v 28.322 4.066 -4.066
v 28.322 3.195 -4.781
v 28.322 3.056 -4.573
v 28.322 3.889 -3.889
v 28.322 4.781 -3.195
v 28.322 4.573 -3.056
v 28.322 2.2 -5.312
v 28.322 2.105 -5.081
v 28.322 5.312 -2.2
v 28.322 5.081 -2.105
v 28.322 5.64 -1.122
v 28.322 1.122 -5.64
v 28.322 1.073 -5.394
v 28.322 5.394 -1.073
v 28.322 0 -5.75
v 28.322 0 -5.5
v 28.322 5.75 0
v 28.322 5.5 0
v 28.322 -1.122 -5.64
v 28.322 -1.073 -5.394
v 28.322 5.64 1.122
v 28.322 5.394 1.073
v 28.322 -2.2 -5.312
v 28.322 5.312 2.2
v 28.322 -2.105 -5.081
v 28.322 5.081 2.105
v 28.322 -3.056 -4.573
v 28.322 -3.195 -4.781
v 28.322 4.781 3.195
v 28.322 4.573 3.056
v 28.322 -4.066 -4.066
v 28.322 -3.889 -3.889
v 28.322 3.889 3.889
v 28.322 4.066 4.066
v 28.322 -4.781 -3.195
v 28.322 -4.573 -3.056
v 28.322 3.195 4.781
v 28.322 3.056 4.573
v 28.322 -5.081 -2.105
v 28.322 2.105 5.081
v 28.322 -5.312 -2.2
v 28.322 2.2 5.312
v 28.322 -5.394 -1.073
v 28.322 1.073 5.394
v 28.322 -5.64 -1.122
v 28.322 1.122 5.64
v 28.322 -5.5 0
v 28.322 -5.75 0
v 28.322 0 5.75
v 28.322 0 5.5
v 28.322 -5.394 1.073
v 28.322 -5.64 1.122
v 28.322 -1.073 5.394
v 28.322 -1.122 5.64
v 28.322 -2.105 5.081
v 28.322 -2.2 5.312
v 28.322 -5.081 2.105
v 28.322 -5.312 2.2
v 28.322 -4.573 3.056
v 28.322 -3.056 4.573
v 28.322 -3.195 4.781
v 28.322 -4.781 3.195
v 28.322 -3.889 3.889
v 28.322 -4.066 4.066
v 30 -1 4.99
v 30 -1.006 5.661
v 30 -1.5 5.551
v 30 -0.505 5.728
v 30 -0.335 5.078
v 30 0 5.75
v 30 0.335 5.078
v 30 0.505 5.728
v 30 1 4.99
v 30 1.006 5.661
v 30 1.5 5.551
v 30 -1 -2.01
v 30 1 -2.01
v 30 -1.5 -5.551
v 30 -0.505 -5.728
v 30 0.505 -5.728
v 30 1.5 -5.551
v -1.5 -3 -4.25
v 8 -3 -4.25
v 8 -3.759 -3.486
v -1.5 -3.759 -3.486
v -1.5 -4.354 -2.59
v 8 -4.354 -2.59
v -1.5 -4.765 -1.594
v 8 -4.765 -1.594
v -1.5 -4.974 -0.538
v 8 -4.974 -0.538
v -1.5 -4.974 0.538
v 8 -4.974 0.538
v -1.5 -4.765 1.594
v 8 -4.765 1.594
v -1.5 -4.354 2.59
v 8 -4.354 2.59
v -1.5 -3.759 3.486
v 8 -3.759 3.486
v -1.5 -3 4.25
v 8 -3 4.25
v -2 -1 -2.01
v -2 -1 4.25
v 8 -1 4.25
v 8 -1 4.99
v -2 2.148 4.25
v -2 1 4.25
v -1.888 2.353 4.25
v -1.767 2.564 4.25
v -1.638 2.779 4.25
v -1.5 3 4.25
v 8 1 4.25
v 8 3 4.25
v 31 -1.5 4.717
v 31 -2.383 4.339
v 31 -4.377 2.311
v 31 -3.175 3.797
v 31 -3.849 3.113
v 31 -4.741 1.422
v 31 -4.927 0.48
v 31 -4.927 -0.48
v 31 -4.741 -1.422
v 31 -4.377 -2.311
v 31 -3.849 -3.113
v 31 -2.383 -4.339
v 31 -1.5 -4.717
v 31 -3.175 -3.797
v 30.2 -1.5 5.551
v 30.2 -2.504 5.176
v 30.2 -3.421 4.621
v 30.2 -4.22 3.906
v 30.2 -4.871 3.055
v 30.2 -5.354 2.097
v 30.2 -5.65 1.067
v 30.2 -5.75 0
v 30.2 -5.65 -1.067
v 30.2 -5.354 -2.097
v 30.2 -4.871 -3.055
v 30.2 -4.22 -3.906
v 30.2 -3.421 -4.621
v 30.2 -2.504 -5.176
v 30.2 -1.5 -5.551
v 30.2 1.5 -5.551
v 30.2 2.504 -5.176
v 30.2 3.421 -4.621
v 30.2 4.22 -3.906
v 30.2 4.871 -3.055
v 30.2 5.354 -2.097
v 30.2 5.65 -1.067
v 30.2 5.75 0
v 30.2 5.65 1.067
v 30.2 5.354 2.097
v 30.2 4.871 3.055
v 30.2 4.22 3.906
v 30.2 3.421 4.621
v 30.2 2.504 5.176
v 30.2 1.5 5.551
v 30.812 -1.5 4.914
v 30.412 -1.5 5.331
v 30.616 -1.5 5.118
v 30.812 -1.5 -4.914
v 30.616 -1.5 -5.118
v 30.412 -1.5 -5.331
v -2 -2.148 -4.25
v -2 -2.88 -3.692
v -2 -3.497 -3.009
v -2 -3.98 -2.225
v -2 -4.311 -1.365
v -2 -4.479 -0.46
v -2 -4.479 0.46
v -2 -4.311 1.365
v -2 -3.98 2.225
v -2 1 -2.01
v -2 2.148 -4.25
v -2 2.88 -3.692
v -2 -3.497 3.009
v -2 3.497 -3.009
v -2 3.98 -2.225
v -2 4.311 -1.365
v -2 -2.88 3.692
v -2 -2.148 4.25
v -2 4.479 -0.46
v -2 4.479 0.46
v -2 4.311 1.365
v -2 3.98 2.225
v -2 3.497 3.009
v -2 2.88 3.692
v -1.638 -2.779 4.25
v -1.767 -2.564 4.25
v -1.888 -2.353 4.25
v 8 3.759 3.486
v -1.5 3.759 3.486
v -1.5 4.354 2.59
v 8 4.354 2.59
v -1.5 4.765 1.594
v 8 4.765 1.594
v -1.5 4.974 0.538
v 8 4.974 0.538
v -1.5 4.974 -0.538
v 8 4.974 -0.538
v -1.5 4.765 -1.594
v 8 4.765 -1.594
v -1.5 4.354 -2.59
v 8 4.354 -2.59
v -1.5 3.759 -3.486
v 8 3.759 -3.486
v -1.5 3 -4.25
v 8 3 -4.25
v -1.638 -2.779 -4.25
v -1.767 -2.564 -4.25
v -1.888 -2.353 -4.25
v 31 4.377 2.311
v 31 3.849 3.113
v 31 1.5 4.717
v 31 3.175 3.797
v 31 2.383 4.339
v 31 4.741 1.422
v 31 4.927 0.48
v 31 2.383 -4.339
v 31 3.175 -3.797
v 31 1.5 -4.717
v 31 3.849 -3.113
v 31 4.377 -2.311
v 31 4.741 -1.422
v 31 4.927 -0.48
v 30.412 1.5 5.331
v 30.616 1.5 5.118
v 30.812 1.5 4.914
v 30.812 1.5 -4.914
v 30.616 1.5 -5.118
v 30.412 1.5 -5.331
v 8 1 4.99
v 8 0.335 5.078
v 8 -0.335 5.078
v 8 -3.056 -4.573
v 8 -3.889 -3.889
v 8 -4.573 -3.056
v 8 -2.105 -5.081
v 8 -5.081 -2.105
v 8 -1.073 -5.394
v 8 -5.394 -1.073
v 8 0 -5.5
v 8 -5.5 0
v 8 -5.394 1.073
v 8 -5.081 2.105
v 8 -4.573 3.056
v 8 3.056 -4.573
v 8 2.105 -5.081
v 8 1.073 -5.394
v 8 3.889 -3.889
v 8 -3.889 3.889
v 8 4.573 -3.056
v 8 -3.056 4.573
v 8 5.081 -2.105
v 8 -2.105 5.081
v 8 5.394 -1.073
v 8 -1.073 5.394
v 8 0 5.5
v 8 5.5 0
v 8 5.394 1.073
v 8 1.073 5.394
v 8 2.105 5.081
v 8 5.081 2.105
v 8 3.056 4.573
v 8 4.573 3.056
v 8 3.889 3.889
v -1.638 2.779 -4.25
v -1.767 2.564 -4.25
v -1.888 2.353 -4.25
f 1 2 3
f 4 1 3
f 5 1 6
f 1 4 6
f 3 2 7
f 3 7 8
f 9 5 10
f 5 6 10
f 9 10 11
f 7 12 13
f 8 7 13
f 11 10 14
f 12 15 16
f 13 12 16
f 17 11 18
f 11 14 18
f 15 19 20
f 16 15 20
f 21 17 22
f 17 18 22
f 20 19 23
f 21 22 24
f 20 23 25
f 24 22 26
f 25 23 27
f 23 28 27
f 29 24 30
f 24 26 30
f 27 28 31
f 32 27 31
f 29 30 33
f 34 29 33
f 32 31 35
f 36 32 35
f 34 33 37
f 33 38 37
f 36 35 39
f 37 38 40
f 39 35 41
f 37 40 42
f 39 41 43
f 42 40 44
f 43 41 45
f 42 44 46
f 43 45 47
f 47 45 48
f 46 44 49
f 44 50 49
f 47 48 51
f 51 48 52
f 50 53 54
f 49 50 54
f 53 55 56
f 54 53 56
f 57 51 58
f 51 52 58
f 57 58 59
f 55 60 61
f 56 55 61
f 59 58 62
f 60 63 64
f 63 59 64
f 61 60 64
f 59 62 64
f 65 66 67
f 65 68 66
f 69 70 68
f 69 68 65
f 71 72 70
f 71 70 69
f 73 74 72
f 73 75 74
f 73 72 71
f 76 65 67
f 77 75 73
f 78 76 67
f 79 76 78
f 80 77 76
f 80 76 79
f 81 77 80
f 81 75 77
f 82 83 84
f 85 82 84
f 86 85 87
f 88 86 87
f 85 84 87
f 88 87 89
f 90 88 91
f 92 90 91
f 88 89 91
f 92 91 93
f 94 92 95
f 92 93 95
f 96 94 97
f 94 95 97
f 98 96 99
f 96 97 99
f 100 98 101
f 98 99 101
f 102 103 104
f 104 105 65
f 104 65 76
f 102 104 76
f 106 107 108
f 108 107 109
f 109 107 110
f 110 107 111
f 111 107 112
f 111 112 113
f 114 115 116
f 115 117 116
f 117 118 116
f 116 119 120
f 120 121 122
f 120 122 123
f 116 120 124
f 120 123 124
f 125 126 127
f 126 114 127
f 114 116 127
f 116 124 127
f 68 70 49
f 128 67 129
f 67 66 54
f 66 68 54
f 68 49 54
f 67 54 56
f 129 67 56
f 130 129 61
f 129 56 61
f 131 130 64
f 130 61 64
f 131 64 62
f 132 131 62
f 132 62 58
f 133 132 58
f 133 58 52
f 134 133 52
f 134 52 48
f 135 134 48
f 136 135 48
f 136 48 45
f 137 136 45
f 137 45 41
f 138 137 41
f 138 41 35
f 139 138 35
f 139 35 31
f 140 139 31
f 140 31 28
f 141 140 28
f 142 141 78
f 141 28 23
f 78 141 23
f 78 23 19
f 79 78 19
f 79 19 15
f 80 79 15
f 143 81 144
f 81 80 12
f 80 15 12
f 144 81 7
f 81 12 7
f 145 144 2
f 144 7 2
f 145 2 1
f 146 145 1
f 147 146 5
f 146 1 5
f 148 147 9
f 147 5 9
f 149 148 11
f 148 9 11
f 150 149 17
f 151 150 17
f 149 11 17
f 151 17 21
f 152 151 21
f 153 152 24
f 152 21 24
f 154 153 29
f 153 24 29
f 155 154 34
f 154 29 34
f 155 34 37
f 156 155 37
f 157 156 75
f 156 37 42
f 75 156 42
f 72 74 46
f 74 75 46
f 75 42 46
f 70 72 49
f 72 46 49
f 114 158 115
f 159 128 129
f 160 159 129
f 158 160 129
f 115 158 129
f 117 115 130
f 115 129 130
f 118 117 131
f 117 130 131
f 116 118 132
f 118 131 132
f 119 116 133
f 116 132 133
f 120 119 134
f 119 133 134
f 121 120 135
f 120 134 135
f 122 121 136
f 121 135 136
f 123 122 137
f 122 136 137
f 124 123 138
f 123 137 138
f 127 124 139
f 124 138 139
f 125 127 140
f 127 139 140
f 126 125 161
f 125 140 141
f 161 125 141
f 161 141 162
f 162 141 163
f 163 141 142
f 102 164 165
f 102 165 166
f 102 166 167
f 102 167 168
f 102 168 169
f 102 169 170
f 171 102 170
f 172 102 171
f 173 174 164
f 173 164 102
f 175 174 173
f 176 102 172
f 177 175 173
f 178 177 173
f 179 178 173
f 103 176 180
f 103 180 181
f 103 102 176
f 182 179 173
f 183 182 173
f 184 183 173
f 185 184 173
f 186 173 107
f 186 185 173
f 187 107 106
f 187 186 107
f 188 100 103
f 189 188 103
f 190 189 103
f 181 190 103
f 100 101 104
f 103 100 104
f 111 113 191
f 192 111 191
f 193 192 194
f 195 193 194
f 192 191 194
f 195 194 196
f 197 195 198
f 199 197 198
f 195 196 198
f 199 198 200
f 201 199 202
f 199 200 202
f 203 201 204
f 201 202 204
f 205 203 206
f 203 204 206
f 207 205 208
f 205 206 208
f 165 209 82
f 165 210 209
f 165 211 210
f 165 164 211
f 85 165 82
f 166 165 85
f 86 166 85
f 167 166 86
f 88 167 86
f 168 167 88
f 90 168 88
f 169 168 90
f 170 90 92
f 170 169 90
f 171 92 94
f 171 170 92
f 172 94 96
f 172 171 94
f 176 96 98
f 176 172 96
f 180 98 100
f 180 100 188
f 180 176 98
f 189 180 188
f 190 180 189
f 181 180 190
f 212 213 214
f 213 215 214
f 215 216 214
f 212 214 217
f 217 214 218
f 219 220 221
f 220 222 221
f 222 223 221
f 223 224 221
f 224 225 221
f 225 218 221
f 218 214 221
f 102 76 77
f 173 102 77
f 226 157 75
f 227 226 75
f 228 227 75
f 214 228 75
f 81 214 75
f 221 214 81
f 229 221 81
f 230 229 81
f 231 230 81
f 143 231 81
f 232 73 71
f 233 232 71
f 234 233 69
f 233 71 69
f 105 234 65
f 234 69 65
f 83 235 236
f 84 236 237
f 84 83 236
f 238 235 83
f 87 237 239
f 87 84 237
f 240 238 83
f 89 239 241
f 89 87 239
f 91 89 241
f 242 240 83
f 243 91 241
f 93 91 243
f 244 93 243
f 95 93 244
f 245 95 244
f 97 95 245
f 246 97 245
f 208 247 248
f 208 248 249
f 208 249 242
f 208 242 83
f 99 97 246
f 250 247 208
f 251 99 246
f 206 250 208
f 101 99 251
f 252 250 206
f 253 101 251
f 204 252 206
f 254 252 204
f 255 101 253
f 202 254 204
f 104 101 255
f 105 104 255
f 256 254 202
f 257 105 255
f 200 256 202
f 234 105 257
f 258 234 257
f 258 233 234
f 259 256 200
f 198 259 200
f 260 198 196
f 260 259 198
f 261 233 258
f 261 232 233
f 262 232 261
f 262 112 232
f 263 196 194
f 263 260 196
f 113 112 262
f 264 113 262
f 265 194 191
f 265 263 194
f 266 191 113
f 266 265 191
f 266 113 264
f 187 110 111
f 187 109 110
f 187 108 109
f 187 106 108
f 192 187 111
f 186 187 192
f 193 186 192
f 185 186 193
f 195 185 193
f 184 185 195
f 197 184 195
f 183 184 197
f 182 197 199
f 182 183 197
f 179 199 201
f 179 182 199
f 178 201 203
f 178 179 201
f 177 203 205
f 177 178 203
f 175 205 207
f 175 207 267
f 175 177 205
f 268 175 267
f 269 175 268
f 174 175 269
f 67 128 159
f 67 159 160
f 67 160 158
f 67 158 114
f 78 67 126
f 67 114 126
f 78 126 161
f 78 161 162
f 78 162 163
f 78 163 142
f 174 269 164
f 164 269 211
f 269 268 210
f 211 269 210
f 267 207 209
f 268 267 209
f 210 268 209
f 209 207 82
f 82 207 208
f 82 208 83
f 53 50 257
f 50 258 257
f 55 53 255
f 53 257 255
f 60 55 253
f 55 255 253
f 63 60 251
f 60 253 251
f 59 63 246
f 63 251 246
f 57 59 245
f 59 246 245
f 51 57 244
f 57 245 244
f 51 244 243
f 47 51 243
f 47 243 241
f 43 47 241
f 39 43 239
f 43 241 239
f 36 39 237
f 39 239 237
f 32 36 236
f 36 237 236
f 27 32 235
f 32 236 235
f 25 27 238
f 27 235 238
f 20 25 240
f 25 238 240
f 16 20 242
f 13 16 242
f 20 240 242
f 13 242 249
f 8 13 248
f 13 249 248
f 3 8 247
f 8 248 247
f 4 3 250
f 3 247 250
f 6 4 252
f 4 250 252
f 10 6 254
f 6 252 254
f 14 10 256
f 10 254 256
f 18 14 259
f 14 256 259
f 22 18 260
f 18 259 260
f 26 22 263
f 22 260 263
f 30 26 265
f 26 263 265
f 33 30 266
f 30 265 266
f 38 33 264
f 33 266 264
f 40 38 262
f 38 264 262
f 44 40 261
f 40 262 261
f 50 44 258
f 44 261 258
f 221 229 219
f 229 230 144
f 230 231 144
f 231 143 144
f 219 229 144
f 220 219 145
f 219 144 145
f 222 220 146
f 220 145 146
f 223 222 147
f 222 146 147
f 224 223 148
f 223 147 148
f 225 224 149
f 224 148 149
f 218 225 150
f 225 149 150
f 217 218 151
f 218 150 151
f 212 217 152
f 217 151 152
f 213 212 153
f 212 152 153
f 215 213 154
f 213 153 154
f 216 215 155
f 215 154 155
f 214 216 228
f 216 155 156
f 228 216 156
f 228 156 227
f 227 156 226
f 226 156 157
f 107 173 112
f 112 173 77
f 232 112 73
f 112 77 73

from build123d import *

# Parameters (mm, degrees)
CHAMFER1_SIZE       = 0.8
CHAMFER2_SIZE       = 1
SKETCH3_W           = 14.289580605
SKETCH3_H           = 3
CUT_EXTRUDE1_DEPTH  = 1
SKETCH5_R           = 8.987407092
CUT_EXTRUDE3_DEPTH  = 8
BOSS_EXTRUDE1_DEPTH = 10
CHAMFER3_SIZE       = 0.5
CUT_EXTRUDE4_DEPTH  = 35


with BuildPart() as part:
    # Sketch1 → Revolve1 (revolve)
    with BuildSketch(Plane.XY, mode=Mode.PRIVATE) as revolve1_sk:
        Polygon((31, 0), (31, 5.75), (28.321868185, 5.75), (28.321868185, 5.5), (0, 5.5), (0, 0), align=None)
    revolve(revolve1_sk.sketch.rotate(Axis((0, 0, 0), (1, 0, 0)), 90), axis=Axis((0, 0, 0), (1, 0, 0)))

    # Chamfer1
    chamfer1_edges = [part.edges().sort_by_distance(p)[0] for p in [
        (31, 0, -5.75),
    ]]
    chamfer(chamfer1_edges, length=CHAMFER1_SIZE)

    # Chamfer2
    chamfer2_edges = [part.edges().sort_by_distance(p)[0] for p in [
        (0, 0, -5.5),
    ]]
    chamfer(chamfer2_edges, length=CHAMFER2_SIZE)

    # Sketch3 → Cut-Extrude1 (cut)
    with BuildSketch(Plane(origin=(31, 0, 0), x_dir=(0, 0, -1), z_dir=(1, 0, 0))):
        with Locations((-0.669103075, 0)):
            Rectangle(SKETCH3_W, SKETCH3_H)
    extrude(amount=-CUT_EXTRUDE1_DEPTH, mode=Mode.SUBTRACT)

    # Sketch5 → Cut-Extrude3 (cut)
    with BuildSketch(Plane.ZY):
        Circle(SKETCH5_R)
    extrude(amount=-CUT_EXTRUDE3_DEPTH, mode=Mode.SUBTRACT)

    # Sketch6 → Boss-Extrude1 (add)
    with BuildSketch(Plane.ZY.offset(-8)):
        with BuildLine():
            Line((-4.25, 3), (-4.25, -3))
            ThreePointArc((-4.25, -3), (0, -5), (4.25, -3))
            Line((4.25, -3), (4.25, 3))
            ThreePointArc((4.25, 3), (0, 5), (-4.25, 3))
        make_face()
    extrude(amount=BOSS_EXTRUDE1_DEPTH)

    # Chamfer3
    chamfer3_edges = [part.edges().sort_by_distance(p)[0] for p in [
        (-2, 5, 0),
        (-2, -5, 0),
    ]]
    chamfer(chamfer3_edges, length=CHAMFER3_SIZE)

    # Sketch7 → Cut-Extrude4 (cut)
    with BuildSketch(Plane(origin=(30, 0, 0), x_dir=(0, 0, -1), z_dir=(1, 0, 0))):
        with BuildLine():
            Line((2.009844577, 1), (-4.990155423, 1))
            ThreePointArc((-4.990155423, 1), (-5.089366478, 0), (-4.990155423, -1))
            Line((-4.990155423, -1), (2.009844577, -1))
            Line((2.009844577, -1), (2.009844577, 1))
        make_face()
    extrude(amount=-CUT_EXTRUDE4_DEPTH, mode=Mode.SUBTRACT)


solid = part.part
